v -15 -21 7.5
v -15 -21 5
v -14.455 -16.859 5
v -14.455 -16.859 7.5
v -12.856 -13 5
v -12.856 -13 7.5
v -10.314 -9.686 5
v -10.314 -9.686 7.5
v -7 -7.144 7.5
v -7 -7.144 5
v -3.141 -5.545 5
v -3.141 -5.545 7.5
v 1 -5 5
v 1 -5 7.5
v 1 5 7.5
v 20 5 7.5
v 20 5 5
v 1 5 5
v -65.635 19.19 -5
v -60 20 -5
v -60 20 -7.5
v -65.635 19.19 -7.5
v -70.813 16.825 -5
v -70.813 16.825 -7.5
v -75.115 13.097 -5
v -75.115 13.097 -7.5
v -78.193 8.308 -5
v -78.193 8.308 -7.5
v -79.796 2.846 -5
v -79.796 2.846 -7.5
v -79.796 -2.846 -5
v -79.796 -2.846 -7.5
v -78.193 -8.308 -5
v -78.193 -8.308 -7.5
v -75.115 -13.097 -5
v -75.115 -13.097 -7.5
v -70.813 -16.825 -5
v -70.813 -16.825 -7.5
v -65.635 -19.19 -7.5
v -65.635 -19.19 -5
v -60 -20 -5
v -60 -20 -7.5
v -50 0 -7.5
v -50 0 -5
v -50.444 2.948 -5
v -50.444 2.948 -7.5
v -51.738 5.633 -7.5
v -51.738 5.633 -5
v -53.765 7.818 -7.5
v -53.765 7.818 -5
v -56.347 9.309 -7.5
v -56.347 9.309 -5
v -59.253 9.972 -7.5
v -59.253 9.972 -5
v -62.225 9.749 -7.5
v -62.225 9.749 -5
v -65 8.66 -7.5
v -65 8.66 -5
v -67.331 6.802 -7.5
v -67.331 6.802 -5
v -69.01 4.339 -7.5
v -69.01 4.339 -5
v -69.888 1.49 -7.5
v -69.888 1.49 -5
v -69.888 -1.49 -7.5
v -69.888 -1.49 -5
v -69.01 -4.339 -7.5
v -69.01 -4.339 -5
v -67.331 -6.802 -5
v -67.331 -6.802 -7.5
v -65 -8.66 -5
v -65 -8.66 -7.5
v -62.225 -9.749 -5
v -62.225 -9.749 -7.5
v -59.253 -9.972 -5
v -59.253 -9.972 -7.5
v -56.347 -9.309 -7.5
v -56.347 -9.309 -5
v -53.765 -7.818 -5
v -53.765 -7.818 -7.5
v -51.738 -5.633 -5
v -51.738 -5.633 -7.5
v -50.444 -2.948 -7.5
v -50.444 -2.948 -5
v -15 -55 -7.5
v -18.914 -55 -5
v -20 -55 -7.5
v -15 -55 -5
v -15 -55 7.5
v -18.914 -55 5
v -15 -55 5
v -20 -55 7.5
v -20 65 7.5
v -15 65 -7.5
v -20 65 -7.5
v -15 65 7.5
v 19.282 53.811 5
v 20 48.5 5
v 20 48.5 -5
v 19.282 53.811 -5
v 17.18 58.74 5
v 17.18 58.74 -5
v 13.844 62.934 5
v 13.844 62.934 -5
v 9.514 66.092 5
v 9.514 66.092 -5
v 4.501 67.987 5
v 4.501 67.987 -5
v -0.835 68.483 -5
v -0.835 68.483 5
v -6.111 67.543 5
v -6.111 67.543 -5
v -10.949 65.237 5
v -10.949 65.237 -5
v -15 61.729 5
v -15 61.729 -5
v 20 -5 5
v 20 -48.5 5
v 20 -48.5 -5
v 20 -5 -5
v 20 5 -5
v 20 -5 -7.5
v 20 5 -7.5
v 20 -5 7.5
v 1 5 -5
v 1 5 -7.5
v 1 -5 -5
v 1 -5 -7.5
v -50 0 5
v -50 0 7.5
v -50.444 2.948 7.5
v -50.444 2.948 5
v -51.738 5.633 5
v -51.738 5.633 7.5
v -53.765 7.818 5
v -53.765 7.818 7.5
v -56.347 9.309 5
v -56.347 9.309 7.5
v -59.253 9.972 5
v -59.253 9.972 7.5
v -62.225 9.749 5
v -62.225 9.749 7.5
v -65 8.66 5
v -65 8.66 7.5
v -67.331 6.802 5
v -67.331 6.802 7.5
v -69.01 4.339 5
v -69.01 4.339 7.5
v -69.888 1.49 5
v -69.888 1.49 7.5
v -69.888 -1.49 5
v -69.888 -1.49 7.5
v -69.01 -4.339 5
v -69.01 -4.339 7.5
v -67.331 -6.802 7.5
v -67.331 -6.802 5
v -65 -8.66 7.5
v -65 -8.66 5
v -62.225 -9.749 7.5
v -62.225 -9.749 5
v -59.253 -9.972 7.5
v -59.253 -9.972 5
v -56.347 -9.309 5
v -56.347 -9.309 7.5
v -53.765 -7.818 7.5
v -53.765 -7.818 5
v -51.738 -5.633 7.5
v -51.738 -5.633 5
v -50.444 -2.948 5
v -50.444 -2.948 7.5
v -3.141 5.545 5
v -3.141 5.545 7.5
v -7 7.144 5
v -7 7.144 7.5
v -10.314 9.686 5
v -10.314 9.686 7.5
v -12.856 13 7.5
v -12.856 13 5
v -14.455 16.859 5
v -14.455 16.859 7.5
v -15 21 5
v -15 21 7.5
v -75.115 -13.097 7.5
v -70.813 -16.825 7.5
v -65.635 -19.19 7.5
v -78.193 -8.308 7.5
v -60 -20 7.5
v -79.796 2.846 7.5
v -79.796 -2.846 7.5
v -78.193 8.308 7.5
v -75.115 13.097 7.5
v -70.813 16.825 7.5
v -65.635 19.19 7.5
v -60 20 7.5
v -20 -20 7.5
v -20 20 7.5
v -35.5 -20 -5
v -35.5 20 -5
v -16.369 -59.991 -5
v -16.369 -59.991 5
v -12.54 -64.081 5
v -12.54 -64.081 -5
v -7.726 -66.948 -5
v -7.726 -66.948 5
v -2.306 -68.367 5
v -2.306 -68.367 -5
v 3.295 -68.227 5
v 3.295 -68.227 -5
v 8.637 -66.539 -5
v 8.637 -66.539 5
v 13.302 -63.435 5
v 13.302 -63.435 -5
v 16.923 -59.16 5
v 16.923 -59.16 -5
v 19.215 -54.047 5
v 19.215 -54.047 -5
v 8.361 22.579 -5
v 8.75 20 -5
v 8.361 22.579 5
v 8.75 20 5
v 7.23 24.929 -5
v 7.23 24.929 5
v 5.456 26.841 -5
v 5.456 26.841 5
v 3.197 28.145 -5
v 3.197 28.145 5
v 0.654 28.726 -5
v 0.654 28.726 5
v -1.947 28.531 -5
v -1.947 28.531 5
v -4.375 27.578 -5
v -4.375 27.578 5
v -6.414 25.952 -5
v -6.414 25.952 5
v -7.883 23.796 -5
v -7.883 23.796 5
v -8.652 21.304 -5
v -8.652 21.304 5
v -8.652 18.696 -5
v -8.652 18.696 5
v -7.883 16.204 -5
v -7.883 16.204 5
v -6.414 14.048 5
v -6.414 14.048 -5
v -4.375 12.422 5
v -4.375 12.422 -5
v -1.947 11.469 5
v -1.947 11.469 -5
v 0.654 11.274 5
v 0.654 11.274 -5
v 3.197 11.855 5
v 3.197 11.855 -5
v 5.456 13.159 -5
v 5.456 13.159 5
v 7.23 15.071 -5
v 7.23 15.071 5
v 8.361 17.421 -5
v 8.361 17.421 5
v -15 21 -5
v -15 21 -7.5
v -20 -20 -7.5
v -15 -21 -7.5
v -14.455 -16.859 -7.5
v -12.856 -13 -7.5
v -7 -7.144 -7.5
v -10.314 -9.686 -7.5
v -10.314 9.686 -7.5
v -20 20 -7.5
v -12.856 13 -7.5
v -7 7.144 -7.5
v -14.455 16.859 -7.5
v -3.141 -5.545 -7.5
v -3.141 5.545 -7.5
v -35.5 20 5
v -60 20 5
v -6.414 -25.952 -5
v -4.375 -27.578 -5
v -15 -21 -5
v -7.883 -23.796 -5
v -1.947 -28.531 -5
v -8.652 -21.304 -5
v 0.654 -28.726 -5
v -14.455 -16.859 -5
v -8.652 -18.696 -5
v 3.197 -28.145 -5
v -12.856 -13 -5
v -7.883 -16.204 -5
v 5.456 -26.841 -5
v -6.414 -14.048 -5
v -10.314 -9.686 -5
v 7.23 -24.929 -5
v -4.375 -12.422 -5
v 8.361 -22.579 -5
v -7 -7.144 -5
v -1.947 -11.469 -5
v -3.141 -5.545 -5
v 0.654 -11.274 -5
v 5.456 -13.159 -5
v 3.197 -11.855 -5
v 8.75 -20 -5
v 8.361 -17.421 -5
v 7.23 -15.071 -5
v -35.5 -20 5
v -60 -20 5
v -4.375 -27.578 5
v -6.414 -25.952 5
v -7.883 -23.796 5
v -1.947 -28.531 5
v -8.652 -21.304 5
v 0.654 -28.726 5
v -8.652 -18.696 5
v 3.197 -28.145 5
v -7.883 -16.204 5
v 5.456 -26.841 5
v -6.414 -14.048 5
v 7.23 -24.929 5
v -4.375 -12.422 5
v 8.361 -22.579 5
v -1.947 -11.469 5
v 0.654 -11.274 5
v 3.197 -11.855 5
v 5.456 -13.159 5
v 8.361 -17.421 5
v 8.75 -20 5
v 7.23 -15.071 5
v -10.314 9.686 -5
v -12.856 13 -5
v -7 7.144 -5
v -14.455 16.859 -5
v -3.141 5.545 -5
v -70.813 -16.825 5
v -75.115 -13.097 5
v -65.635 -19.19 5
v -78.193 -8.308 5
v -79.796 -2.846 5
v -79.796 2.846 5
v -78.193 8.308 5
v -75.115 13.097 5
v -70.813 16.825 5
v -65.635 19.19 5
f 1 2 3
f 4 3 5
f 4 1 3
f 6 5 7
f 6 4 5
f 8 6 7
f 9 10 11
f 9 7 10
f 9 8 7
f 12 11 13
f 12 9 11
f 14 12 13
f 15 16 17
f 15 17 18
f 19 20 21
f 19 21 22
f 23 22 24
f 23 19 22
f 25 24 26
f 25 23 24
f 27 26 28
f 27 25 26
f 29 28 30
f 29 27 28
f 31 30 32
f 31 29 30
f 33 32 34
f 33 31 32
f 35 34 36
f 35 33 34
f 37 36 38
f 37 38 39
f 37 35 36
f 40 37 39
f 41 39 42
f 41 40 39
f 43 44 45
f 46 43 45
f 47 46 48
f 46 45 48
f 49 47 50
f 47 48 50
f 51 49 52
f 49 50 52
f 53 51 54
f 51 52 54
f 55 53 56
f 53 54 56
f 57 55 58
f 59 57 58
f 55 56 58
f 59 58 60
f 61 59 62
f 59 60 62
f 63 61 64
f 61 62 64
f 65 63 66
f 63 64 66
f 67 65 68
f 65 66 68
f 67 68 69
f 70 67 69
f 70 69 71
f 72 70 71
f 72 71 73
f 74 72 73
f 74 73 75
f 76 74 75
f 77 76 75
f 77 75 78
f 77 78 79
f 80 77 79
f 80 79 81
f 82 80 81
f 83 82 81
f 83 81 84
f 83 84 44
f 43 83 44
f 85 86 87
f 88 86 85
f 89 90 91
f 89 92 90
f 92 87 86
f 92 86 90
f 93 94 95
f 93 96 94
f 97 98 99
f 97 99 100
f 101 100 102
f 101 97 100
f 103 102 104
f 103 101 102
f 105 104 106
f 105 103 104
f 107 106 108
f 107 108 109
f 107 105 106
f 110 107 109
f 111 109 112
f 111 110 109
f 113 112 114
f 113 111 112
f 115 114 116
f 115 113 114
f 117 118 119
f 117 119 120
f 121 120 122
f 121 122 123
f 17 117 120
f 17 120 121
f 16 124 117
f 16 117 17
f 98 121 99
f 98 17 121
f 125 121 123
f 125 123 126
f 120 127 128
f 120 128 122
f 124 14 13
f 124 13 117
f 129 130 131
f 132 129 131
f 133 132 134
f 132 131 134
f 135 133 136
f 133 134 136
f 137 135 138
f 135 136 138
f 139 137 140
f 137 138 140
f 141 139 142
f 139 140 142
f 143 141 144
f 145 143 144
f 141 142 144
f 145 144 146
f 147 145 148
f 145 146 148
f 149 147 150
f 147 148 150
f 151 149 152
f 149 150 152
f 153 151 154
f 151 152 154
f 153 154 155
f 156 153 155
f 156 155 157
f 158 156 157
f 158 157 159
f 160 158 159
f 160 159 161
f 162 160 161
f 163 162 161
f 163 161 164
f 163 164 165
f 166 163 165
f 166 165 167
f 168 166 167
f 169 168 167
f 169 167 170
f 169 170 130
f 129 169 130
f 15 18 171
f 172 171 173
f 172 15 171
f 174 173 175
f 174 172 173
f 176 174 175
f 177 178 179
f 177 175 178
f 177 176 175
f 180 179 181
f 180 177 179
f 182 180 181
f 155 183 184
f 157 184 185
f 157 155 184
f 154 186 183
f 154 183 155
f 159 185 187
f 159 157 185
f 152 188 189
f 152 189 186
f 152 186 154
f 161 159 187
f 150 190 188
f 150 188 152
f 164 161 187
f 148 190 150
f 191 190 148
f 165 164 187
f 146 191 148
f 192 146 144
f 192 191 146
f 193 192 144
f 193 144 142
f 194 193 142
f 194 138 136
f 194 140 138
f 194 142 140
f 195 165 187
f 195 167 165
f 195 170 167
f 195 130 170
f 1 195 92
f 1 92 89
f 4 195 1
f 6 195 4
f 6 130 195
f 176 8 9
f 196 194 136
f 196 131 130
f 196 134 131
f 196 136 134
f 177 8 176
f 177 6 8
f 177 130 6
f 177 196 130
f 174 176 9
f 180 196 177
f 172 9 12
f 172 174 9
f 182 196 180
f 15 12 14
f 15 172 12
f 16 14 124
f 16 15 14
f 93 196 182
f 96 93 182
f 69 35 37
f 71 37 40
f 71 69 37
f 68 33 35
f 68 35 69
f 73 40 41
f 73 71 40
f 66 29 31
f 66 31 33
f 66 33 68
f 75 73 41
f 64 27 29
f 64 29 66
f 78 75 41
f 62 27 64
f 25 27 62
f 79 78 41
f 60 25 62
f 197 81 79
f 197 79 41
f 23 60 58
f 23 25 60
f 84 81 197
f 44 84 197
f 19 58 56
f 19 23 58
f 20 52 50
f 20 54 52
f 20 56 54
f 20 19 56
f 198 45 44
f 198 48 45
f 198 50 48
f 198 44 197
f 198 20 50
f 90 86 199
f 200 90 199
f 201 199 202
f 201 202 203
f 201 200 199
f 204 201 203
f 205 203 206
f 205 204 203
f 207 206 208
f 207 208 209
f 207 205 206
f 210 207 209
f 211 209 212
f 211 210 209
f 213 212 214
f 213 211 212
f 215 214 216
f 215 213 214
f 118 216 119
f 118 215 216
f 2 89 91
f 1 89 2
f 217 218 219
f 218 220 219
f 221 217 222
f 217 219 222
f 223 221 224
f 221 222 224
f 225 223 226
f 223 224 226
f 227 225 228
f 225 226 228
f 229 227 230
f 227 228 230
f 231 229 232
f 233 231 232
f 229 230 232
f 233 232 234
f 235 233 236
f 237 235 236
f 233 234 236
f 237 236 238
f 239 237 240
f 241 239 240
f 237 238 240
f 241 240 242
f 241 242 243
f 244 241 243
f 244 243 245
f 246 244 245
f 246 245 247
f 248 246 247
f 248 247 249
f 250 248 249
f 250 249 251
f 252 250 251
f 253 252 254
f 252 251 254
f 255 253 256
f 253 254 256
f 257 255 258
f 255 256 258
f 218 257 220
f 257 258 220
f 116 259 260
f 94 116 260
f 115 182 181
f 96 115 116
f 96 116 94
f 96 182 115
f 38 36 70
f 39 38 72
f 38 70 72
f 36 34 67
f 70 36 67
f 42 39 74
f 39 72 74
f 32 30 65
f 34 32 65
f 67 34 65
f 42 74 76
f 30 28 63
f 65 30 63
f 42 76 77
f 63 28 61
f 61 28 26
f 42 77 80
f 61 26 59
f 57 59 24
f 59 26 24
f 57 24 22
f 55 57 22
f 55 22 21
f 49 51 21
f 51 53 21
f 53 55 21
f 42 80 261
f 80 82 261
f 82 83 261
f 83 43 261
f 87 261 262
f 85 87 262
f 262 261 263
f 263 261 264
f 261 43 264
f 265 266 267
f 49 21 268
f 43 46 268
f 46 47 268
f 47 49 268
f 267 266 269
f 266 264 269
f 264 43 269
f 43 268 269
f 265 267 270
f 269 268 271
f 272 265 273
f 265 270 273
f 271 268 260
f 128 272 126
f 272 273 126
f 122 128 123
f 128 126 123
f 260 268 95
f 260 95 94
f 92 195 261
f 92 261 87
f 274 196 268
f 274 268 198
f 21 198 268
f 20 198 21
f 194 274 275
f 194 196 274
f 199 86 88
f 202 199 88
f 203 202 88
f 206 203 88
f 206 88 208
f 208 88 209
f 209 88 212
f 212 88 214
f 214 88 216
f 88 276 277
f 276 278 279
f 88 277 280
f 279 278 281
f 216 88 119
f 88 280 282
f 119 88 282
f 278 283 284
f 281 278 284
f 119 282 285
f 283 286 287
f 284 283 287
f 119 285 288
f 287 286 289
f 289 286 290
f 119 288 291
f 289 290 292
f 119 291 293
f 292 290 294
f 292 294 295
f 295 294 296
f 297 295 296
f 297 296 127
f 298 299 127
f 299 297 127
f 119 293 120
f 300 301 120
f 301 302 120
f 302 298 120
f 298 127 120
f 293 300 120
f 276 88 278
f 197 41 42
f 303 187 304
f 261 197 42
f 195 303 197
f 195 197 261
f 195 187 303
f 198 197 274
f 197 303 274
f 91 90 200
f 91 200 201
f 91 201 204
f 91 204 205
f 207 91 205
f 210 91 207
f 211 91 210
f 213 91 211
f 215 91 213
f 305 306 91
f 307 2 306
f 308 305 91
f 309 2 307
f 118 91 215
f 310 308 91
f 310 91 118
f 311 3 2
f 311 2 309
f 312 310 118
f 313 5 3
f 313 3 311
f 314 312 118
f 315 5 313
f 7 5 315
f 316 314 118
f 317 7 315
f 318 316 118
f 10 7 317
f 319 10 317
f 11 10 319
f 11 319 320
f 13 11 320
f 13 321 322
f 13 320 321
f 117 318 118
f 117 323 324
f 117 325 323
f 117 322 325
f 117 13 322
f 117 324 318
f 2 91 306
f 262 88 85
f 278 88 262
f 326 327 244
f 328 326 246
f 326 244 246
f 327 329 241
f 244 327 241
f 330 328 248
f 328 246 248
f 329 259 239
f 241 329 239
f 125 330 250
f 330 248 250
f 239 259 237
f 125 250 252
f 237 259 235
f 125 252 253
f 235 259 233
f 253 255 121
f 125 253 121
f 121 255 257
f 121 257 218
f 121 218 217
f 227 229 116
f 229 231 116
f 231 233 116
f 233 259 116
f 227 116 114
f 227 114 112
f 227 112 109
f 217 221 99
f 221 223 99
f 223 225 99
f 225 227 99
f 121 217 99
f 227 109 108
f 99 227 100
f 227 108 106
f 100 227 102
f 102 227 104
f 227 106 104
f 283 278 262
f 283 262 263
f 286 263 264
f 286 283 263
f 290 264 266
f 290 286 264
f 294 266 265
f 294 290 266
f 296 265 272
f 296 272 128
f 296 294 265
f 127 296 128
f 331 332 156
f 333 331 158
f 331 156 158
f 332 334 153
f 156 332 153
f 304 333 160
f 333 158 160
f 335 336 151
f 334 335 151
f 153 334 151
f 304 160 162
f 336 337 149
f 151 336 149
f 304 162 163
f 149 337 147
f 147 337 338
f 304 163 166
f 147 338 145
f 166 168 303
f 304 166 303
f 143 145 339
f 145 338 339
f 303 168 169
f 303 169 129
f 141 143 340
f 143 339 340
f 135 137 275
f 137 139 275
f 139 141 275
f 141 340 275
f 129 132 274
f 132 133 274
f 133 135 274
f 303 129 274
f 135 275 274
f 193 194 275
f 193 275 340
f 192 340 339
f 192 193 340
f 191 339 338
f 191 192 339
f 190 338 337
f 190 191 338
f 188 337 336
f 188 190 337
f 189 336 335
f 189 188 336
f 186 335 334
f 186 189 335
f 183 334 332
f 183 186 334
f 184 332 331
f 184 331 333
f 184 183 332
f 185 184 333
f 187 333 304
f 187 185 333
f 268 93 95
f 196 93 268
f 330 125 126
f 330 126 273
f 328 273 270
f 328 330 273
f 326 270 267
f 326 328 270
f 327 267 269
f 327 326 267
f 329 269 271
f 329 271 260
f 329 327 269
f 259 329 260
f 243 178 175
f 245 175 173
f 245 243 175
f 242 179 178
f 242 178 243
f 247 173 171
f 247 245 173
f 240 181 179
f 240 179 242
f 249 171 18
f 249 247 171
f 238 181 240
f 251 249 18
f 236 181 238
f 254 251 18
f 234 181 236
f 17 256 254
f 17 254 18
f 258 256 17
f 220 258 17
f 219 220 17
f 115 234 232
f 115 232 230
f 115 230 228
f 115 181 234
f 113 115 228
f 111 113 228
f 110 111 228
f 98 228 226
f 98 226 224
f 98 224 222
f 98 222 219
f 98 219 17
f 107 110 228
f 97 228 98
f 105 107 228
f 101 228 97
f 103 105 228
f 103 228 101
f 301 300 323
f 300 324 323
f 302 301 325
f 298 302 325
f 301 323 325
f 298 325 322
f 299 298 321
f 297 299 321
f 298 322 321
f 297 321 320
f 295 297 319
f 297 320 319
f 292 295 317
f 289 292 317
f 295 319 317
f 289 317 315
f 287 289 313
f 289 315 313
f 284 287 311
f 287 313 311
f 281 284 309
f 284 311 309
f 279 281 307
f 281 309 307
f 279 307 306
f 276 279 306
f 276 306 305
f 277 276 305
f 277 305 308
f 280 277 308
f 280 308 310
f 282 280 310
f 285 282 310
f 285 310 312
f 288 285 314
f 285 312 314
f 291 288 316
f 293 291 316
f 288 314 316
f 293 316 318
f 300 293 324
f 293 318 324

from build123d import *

# Parameters (mm, degrees)
F1_DEPTH = 5
F2_R     = 8.75
F3_DEPTH = 12.5
F5_DEPTH = 7.5
F7_DEPTH = 5
F8_R     = 10
F9_DEPTH = 25


with BuildPart() as f1:
    # F0 (on Top) → F1 (new body, symmetric)
    with BuildSketch(Plane.XY):
        with BuildLine():
            Line((20, -48.5), (20, 48.5))
            ThreePointArc((20, 48.5), (0, 68.5), (-20, 48.5))
            Line((-20, 48.5), (-20, -48.5))
            ThreePointArc((-20, -48.5), (0, -68.5), (20, -48.5))
        make_face()
    extrude(amount=F1_DEPTH, both=True)

    # F2 (on Top) → F3 (cut, symmetric)
    with BuildSketch(Plane.XY):
        with Locations((0, 20)):
            Circle(F2_R)
        with Locations((0, -20)):
            Circle(F2_R)
    extrude(amount=F3_DEPTH, both=True, mode=Mode.SUBTRACT)

    # F4 (on Top) → F5 (join, symmetric)
    with BuildSketch(Plane.XY):
        with BuildLine():
            Line((-15, 65), (-20, 65))
            Line((-20, 65), (-20, 20))
            Line((-20, 20), (-60, 20))
            ThreePointArc((-60, 20), (-80, 0), (-60, -20))
            Line((-60, -20), (-20, -20))
            Line((-20, -20), (-20, -55))
            Line((-20, -55), (-15, -55))
            Line((-15, -55), (-15, -21))
            ThreePointArc((-15, -21), (-10.313708499, -9.686291501), (1, -5))
            Line((1, -5), (20, -5))
            Line((20, -5), (20, 5))
            Line((20, 5), (1, 5))
            ThreePointArc((1, 5), (-10.313708499, 9.686291501), (-15, 21))
            Line((-15, 21), (-15, 65))
        make_face()
    extrude(amount=F5_DEPTH, both=True)

    # F6 (on Top) → F7 (cut, symmetric)
    with BuildSketch(Plane.XY):
        with BuildLine():
            Line((-35.5, 20), (-60, 20))
            ThreePointArc((-60, 20), (-80, 0), (-60, -20))
            Line((-60, -20), (-35.5, -20))
            Line((-35.5, -20), (-35.5, 20))
        make_face()
    extrude(amount=F7_DEPTH, both=True, mode=Mode.SUBTRACT)

    # F8 (on face) → F9 (cut)
    with BuildSketch(Plane.XY.offset(7.5)):
        with Locations((-60, 0)):
            Circle(F8_R)
    extrude(amount=-F9_DEPTH, mode=Mode.SUBTRACT)


solid = f1.part
